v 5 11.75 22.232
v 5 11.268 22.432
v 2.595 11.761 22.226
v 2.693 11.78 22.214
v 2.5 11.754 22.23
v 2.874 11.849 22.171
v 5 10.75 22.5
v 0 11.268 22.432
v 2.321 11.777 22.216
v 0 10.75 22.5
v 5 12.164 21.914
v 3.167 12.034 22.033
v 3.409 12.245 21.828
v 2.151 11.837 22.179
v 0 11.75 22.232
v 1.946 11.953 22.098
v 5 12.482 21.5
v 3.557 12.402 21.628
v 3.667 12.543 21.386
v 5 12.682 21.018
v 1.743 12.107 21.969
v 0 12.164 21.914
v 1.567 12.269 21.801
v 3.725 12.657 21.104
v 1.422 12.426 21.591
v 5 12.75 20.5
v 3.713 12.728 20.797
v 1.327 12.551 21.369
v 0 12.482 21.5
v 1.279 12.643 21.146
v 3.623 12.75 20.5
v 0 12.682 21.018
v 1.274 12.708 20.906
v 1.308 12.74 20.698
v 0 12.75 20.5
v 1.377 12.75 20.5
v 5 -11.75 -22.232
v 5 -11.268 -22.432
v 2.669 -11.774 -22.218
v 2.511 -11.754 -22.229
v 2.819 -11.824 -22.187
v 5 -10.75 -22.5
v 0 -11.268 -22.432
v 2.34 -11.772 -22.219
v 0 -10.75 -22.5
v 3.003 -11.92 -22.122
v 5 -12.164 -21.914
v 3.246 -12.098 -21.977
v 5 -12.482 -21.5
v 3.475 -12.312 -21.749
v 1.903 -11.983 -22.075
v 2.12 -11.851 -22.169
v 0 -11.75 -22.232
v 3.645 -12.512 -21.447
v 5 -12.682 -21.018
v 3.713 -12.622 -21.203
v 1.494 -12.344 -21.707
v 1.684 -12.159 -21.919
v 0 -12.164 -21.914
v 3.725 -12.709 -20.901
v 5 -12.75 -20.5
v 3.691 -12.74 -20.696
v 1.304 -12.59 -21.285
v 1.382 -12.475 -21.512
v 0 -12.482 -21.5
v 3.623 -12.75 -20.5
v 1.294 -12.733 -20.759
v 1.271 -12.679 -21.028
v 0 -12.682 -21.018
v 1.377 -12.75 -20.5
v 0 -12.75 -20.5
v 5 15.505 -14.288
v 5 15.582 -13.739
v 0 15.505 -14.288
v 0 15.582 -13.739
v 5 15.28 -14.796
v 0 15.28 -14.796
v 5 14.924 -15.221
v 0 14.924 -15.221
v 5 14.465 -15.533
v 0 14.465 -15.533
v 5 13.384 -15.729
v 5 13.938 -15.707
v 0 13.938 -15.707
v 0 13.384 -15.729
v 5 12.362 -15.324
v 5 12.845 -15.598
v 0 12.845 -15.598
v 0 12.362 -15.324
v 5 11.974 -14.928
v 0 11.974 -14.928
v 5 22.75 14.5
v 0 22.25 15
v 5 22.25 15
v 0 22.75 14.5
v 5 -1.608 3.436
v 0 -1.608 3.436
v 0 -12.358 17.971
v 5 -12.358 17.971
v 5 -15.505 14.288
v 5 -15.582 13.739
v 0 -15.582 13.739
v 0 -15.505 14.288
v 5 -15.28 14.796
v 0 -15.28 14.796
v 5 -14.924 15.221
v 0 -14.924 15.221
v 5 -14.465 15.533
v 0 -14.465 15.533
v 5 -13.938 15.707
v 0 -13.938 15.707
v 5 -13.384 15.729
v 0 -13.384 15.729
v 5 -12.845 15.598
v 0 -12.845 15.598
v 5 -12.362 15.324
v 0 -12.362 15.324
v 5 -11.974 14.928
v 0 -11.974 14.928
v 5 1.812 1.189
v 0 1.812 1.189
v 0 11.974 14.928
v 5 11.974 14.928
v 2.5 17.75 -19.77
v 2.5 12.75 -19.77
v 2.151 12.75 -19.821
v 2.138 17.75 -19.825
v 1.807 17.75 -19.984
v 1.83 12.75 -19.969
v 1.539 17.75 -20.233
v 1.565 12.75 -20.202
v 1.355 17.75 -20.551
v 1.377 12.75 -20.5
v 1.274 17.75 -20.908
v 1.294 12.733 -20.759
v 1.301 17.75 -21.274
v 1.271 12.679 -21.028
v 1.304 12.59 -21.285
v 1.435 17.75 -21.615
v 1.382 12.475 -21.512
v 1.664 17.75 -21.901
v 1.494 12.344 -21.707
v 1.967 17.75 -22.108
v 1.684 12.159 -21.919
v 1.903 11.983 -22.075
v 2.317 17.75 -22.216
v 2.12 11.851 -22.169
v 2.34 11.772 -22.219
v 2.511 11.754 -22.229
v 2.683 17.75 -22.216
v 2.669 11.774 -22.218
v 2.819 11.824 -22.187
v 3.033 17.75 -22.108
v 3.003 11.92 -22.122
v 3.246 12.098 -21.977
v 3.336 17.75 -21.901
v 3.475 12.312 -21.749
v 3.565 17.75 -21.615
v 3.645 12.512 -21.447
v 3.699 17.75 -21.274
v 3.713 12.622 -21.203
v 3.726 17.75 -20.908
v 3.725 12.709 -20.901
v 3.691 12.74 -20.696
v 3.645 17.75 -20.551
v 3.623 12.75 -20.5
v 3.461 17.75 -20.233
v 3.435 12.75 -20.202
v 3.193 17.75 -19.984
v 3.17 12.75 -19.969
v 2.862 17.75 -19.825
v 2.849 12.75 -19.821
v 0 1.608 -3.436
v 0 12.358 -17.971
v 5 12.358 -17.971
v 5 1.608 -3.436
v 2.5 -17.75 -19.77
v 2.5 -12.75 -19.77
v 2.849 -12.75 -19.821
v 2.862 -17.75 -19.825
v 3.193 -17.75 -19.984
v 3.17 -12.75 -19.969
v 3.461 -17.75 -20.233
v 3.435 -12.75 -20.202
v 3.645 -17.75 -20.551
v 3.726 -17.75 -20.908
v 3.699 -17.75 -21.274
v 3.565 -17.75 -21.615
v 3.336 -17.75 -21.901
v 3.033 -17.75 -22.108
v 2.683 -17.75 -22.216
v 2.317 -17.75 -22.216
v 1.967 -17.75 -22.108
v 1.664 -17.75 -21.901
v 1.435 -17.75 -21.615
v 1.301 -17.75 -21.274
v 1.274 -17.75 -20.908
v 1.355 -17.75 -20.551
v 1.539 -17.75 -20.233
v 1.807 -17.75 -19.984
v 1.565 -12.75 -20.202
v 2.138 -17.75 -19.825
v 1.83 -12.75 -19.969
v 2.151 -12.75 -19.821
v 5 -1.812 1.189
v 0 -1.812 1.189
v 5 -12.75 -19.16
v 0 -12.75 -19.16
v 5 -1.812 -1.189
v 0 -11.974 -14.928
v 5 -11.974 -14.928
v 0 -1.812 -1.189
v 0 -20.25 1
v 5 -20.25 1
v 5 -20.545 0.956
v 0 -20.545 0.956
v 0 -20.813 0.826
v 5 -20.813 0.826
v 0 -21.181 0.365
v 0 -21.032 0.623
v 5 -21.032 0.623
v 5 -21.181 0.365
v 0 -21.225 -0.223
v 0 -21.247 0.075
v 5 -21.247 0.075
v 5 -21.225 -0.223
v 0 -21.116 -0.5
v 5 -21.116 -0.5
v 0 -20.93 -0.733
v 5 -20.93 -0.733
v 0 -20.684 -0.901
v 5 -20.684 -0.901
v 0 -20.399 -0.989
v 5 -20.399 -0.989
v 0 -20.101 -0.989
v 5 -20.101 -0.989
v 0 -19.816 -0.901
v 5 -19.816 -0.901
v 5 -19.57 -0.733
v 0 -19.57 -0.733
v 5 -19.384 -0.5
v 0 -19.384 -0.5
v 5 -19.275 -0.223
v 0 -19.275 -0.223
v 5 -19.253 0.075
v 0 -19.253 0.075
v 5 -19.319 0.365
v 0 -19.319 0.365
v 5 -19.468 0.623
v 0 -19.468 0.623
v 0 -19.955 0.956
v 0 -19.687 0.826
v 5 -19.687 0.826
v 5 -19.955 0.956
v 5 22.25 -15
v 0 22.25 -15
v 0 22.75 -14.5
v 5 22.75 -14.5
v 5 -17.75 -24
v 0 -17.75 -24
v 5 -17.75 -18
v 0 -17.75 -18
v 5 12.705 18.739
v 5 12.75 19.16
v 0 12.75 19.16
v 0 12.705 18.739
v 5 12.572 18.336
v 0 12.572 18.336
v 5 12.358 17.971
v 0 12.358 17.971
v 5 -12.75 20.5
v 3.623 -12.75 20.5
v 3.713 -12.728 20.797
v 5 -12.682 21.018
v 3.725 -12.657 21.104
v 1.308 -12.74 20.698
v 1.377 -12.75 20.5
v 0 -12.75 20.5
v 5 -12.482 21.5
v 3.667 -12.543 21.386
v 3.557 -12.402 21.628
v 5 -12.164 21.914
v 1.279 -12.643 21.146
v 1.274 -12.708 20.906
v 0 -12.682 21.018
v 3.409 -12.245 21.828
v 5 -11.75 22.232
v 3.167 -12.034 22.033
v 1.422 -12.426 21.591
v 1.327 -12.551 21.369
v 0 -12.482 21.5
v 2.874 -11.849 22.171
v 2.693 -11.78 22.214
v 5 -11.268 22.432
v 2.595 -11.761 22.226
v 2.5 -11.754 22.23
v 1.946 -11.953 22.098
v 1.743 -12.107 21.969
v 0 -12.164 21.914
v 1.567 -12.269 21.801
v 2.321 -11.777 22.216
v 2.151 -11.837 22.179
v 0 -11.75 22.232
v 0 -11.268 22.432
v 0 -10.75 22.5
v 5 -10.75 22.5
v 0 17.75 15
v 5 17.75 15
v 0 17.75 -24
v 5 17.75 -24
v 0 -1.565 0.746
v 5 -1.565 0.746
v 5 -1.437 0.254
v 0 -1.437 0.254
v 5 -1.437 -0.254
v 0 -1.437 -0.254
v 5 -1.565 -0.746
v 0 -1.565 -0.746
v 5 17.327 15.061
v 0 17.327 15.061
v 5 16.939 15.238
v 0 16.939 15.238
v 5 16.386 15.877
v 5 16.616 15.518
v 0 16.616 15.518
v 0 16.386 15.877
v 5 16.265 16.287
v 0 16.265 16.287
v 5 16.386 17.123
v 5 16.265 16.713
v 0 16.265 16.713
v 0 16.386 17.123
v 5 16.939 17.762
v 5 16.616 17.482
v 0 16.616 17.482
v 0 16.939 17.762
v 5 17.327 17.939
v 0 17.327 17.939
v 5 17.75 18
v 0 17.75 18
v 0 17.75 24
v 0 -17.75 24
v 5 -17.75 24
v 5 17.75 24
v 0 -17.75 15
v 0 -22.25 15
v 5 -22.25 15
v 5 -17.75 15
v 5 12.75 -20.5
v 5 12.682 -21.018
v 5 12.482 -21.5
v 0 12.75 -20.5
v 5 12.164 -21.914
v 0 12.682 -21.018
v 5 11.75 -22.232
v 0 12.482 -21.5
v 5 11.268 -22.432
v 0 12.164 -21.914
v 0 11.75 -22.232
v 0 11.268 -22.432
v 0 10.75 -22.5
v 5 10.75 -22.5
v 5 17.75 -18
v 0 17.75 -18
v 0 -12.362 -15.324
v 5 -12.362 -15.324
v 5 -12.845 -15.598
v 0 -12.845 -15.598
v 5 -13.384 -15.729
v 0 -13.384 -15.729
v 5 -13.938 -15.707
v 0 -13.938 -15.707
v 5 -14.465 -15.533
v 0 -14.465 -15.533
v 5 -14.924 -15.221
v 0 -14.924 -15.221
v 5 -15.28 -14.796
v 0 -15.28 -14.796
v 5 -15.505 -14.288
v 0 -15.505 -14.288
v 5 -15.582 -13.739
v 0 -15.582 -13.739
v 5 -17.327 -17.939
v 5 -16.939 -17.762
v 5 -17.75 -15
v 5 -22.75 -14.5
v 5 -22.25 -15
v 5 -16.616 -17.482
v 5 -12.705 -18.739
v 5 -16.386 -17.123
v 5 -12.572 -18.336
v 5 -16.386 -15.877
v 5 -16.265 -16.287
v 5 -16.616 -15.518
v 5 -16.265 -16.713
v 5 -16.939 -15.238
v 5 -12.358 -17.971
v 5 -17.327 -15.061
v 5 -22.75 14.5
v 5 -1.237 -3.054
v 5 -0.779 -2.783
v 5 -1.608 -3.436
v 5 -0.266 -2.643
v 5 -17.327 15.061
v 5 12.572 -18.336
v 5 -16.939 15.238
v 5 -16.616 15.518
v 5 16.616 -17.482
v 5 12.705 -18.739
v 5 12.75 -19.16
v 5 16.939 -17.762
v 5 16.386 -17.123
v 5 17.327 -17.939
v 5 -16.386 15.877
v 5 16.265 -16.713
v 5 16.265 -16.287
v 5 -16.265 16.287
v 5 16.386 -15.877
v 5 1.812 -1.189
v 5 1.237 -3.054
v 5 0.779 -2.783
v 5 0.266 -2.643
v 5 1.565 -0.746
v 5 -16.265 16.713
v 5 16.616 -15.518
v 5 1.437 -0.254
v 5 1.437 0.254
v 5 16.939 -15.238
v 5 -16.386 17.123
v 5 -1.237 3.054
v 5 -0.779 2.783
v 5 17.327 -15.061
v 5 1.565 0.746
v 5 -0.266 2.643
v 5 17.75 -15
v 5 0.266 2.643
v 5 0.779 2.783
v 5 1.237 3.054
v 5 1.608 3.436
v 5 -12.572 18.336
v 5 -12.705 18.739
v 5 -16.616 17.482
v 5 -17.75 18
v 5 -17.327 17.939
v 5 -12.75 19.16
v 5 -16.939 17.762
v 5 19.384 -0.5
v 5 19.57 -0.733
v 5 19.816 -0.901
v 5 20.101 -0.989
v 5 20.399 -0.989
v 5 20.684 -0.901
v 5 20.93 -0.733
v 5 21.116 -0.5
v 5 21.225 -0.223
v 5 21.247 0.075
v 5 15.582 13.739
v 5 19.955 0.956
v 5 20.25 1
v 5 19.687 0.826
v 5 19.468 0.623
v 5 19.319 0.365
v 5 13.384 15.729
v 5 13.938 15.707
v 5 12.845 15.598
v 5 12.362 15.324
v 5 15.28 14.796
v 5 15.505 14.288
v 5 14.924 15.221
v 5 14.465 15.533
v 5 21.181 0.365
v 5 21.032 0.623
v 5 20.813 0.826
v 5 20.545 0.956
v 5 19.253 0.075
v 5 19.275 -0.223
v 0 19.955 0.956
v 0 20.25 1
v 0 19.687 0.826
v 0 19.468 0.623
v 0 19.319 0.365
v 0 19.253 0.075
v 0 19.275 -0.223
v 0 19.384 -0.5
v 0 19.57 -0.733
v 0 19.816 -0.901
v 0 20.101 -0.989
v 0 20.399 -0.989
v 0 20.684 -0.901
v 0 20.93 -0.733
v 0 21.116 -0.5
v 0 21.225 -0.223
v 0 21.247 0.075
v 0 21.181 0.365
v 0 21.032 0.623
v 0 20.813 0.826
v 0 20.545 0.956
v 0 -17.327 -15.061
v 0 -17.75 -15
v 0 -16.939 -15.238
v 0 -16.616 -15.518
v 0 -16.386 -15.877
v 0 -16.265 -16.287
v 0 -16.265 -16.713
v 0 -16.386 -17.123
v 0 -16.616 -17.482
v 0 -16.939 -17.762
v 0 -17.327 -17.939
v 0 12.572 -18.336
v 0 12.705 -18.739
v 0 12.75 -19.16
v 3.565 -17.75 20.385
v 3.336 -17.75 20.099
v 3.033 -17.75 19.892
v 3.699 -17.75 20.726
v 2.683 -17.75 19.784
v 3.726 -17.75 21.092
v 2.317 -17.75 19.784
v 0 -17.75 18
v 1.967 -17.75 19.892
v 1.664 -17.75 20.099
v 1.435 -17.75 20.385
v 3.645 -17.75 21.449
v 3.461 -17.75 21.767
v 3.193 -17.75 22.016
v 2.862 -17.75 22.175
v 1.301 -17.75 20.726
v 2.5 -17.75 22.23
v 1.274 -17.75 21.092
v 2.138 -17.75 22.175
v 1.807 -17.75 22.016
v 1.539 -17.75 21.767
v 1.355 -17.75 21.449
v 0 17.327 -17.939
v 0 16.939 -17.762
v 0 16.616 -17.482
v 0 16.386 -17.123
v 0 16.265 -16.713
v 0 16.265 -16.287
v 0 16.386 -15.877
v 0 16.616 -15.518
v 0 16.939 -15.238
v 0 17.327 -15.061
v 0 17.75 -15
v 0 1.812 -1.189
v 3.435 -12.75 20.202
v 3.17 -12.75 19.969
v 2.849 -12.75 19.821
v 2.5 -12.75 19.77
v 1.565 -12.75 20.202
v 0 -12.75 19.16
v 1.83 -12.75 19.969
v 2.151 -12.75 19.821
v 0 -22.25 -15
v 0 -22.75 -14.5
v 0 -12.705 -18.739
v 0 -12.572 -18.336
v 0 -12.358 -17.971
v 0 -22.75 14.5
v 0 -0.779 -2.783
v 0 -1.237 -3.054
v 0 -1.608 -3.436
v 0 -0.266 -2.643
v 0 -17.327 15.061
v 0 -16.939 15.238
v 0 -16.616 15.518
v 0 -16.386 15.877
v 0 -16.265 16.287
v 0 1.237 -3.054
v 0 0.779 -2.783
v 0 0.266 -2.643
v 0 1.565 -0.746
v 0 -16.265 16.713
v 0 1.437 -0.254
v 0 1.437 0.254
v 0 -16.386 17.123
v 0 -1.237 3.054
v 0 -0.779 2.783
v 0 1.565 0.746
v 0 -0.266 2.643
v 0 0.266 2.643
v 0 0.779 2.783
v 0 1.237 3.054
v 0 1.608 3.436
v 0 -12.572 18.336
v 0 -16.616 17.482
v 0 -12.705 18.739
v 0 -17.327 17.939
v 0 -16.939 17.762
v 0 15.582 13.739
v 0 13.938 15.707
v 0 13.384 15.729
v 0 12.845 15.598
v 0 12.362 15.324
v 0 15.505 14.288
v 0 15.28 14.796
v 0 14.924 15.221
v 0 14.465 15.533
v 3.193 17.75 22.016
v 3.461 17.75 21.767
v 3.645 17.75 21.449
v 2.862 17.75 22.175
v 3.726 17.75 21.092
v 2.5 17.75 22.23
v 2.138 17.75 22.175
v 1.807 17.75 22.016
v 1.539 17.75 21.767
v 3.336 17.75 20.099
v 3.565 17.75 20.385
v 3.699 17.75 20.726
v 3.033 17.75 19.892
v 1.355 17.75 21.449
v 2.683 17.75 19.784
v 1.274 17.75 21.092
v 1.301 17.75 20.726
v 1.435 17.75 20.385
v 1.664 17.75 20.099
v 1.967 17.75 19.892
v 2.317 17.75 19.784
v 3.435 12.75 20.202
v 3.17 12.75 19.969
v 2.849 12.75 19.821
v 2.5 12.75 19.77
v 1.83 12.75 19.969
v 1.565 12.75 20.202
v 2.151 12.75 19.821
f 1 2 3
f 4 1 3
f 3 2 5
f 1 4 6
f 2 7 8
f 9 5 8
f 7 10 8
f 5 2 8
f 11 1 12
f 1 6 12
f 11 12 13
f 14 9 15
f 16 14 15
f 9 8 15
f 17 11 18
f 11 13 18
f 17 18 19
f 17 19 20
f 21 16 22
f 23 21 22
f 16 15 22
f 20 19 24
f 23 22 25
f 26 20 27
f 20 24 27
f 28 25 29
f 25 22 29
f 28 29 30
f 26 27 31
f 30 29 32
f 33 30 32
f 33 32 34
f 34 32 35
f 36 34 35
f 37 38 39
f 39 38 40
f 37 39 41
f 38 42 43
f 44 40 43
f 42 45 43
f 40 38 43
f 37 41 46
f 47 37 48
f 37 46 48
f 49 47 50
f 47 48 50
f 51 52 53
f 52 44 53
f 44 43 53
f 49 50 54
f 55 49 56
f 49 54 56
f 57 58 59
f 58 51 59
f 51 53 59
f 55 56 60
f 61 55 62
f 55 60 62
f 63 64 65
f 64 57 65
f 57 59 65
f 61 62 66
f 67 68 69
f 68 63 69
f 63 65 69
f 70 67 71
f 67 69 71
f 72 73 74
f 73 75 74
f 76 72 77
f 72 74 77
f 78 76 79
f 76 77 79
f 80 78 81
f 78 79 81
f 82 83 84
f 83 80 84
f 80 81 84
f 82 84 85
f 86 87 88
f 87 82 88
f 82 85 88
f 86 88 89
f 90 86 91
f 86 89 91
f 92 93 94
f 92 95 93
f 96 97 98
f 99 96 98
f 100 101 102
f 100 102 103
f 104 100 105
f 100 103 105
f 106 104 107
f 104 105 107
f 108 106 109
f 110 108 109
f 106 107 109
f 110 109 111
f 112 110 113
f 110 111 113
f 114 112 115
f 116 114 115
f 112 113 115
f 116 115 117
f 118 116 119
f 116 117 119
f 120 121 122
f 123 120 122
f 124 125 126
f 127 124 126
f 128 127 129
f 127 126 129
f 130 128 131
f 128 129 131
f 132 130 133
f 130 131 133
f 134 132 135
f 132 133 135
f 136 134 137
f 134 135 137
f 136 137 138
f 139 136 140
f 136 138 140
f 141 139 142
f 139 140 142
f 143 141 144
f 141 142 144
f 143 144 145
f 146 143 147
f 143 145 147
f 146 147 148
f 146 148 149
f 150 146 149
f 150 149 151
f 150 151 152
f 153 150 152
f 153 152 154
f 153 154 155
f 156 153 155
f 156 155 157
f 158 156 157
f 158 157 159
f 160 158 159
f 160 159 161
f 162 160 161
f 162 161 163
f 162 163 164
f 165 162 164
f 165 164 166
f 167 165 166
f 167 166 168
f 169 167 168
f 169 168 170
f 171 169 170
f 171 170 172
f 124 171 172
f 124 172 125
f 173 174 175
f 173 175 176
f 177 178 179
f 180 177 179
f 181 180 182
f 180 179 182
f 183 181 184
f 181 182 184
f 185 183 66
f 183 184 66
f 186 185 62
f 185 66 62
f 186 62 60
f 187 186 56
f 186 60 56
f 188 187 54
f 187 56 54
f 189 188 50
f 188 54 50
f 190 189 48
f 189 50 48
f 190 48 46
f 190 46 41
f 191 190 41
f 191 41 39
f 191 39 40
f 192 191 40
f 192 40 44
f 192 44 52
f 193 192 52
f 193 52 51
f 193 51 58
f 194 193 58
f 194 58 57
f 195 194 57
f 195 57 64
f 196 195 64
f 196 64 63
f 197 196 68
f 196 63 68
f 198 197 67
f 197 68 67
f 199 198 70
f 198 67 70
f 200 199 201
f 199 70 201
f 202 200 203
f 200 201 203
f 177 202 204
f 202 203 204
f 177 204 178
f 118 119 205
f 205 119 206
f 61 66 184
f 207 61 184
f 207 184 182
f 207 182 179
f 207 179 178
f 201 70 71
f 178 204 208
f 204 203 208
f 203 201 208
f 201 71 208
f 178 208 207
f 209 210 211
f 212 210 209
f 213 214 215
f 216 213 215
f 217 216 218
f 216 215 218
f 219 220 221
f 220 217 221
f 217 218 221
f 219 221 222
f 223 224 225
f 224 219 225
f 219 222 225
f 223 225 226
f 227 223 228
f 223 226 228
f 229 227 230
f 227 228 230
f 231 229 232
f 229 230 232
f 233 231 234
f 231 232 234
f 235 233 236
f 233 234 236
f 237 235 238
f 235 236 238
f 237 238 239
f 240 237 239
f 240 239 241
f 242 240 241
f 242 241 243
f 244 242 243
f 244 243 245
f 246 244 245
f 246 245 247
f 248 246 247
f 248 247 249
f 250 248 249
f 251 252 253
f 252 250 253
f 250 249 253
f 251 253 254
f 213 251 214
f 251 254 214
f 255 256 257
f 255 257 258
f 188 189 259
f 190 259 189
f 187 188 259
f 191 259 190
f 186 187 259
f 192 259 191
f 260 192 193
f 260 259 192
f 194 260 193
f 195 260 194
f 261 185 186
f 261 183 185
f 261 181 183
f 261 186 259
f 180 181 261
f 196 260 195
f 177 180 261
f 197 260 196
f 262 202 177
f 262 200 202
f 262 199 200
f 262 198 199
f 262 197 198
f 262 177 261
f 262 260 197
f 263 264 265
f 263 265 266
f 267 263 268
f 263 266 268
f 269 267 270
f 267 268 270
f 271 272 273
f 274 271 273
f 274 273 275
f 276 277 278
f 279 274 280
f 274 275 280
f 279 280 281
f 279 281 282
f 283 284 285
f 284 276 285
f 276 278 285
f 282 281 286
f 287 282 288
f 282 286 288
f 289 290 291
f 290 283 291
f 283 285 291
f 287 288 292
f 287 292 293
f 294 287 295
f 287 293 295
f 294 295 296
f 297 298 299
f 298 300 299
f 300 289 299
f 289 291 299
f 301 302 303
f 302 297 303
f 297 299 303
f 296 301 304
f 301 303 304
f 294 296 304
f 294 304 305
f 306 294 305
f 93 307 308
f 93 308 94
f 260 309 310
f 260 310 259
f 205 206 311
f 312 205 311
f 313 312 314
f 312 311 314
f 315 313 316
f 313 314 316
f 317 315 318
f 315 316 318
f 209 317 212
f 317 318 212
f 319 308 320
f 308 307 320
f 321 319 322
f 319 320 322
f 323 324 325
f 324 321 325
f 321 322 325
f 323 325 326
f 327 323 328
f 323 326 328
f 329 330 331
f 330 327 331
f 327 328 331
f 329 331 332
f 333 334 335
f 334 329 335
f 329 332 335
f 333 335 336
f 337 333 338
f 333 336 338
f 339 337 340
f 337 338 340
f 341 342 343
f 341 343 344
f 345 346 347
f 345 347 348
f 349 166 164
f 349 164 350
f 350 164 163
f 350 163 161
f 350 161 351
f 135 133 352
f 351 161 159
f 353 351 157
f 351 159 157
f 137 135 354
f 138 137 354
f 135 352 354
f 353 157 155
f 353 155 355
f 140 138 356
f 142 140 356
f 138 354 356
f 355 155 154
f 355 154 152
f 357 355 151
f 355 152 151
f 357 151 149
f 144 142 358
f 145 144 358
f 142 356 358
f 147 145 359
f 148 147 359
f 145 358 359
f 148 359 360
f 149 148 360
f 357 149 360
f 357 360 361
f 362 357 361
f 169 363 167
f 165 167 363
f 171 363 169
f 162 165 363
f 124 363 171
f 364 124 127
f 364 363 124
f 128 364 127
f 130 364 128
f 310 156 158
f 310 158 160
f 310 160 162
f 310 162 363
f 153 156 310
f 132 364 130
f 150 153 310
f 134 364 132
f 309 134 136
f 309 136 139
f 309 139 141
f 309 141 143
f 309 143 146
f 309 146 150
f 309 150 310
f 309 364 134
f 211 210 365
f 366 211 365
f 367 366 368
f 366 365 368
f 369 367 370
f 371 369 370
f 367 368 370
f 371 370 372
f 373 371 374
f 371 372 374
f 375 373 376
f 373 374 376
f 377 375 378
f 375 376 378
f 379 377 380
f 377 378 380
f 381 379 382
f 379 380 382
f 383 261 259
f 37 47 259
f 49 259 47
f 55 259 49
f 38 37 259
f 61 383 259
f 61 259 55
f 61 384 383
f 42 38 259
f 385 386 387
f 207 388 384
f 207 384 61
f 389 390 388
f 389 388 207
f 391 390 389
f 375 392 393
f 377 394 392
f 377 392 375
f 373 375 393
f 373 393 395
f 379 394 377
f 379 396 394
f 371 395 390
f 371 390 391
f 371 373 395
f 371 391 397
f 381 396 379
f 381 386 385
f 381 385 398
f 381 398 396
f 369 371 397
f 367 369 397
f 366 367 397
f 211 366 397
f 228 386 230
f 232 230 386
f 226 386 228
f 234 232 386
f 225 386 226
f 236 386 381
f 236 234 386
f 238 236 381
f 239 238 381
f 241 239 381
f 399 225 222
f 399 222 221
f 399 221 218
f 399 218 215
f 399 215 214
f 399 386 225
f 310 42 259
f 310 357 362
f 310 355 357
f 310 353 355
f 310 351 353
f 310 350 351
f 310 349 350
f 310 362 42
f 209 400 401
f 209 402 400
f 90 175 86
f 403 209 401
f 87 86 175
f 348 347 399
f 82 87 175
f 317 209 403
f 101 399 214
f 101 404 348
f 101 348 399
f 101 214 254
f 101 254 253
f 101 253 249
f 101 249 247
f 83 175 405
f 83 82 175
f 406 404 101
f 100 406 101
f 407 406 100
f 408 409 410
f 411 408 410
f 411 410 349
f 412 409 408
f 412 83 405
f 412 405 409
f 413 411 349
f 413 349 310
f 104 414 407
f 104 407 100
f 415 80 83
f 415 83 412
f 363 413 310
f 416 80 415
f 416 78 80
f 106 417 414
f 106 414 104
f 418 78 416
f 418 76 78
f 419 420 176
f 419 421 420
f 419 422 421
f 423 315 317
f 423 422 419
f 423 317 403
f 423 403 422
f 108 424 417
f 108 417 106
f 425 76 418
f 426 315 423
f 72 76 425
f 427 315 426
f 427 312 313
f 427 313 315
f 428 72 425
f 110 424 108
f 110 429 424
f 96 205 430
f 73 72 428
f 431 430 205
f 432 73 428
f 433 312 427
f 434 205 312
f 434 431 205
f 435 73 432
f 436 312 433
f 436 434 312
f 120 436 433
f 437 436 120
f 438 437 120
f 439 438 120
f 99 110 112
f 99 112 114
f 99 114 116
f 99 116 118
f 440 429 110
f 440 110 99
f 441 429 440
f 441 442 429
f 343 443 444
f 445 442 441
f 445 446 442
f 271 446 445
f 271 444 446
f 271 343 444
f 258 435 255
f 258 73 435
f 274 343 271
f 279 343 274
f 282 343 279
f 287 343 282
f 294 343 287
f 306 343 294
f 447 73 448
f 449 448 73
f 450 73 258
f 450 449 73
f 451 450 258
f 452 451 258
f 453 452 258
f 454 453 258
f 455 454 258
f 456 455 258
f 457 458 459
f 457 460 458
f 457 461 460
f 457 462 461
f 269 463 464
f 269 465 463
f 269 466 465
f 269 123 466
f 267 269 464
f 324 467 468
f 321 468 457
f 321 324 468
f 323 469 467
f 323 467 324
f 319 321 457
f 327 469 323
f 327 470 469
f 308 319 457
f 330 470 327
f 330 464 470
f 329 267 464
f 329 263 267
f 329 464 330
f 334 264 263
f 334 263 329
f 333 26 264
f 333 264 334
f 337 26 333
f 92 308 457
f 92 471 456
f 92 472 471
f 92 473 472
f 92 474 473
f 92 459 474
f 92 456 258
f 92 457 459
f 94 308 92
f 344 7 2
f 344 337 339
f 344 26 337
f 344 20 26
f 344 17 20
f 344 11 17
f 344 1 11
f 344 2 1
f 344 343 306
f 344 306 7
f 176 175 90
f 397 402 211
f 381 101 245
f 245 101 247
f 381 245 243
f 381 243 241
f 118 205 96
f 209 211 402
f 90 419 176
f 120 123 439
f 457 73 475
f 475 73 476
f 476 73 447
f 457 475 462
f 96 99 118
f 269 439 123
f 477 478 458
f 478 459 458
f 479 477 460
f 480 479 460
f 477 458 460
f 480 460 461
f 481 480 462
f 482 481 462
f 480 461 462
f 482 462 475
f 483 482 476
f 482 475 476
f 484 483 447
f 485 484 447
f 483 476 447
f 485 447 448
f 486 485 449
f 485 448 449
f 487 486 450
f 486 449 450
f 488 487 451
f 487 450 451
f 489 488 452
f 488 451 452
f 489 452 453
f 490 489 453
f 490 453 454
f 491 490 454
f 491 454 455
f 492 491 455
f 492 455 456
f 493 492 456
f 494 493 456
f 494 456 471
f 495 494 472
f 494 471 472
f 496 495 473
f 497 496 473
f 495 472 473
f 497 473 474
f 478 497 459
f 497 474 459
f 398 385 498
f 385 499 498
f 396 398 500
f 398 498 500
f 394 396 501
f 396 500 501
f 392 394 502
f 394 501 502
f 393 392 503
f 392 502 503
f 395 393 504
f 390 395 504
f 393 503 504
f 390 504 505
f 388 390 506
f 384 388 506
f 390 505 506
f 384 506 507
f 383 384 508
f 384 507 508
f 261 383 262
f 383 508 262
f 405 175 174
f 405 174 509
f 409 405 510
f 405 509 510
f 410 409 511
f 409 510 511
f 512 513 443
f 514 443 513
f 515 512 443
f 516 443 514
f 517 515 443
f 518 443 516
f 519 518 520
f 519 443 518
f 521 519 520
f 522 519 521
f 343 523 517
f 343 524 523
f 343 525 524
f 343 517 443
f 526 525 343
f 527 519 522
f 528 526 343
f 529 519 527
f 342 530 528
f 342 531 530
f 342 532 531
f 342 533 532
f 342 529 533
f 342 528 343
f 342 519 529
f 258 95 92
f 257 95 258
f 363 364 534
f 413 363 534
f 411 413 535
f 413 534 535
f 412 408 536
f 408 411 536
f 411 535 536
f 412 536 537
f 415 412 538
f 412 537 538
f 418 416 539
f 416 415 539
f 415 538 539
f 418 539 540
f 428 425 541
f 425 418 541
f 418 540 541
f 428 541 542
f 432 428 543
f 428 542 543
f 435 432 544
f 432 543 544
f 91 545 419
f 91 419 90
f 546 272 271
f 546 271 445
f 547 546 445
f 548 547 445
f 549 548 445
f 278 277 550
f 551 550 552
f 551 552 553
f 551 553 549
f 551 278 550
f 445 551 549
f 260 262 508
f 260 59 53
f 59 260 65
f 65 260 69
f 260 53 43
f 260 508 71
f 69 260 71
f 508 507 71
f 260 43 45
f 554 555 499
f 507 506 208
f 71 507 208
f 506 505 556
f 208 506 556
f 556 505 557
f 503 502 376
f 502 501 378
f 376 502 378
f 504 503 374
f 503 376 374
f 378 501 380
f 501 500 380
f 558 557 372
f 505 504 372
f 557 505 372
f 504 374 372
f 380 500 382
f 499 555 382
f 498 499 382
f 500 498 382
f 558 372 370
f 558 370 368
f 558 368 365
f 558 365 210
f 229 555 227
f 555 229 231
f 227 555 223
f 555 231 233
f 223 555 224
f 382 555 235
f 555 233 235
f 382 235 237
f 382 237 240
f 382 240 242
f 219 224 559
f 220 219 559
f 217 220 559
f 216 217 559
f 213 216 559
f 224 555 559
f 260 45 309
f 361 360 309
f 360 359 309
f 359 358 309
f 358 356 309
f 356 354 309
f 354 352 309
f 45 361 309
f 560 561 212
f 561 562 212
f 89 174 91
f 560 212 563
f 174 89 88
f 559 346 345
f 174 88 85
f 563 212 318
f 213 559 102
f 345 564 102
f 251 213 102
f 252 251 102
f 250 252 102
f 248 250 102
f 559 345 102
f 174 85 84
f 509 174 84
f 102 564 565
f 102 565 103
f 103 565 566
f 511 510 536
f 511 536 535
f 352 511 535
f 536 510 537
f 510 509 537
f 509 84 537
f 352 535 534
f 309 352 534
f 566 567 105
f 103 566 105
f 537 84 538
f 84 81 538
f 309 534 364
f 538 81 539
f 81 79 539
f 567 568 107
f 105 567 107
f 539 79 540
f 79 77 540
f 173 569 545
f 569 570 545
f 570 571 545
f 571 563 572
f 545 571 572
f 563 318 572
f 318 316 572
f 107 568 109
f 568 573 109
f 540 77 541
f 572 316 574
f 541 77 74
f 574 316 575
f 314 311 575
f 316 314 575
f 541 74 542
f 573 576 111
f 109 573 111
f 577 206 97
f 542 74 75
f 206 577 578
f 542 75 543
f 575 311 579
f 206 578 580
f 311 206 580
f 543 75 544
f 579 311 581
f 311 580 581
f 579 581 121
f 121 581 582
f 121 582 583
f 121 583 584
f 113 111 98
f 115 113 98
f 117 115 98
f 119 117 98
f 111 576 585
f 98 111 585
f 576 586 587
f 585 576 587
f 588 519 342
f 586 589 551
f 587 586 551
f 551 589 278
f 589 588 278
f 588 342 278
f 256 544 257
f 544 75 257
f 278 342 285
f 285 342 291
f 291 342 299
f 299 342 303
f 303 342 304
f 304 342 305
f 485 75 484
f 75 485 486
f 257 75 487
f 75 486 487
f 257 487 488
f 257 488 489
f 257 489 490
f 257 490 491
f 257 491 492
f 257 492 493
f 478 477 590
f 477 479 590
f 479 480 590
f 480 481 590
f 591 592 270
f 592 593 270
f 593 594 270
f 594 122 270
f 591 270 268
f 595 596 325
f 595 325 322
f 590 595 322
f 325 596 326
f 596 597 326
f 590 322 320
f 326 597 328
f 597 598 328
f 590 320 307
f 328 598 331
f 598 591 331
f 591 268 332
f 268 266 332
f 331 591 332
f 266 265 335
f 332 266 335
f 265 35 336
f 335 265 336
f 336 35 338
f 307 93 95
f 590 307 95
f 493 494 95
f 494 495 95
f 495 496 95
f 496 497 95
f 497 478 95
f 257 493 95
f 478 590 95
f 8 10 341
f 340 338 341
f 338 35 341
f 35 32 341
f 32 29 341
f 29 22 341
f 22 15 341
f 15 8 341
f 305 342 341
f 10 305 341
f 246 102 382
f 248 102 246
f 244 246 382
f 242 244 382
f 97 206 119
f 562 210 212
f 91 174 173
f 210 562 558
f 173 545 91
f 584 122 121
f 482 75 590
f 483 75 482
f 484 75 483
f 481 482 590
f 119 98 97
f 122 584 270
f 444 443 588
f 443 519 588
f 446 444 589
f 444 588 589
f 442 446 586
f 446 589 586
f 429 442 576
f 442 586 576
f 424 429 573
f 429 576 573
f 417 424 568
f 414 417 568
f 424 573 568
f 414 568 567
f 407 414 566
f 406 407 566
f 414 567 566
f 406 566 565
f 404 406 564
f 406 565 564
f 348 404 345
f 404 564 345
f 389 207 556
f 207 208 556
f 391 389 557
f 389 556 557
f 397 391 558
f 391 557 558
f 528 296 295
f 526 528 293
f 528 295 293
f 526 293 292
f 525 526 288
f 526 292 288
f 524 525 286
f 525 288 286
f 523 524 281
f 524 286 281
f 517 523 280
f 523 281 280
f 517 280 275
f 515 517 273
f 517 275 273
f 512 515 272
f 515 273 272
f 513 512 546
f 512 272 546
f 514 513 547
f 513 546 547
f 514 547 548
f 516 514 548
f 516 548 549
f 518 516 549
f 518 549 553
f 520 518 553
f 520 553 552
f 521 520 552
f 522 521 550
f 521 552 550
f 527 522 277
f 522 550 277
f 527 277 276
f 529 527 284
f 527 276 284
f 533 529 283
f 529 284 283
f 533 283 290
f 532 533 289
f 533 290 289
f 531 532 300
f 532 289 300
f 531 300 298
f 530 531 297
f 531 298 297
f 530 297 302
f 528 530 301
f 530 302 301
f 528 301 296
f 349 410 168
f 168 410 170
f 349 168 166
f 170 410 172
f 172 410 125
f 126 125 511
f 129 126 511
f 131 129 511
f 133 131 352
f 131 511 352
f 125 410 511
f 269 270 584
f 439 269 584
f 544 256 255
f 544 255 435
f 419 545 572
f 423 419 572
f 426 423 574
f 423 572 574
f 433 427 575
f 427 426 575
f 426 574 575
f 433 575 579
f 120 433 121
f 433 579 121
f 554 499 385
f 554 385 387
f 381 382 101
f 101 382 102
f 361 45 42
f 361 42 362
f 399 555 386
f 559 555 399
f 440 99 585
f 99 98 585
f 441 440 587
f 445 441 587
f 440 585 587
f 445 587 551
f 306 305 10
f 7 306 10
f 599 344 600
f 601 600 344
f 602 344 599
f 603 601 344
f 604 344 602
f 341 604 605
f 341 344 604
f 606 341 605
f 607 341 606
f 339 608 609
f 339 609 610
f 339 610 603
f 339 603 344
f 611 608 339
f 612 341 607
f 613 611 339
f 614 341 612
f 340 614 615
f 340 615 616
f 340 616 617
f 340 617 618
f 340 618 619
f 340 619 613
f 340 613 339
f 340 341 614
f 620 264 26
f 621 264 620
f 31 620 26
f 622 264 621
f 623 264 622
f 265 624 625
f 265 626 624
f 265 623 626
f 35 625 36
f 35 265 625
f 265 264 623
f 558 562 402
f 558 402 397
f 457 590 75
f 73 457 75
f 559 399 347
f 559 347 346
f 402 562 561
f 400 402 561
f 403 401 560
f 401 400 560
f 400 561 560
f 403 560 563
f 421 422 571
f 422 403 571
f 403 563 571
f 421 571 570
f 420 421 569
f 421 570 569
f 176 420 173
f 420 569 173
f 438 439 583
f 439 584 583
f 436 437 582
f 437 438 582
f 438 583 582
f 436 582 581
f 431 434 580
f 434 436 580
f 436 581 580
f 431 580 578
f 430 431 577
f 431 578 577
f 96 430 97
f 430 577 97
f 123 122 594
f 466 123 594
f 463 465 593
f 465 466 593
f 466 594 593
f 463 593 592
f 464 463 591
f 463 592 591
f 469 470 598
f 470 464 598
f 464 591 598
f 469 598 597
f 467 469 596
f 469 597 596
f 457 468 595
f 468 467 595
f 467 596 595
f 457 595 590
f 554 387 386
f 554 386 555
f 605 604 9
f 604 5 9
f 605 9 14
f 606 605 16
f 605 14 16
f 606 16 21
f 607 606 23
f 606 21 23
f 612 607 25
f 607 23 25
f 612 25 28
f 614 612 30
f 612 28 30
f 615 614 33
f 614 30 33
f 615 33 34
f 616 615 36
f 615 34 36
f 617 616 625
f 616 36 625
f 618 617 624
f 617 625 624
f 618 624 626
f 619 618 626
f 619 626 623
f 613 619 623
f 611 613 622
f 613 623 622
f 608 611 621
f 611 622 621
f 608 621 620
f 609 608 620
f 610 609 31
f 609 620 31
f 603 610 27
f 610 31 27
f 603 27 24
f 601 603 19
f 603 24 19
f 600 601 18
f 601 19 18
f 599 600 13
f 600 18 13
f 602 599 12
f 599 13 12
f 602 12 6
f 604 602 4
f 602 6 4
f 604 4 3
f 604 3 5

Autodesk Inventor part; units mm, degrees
ref_plane "YZ Plane" through (0, 0, 0) normal (1, 0, 0) x (0, 1, 0)
ref_plane "XZ Plane" through (0, 0, 0) normal (0, 1, 0) x (-1, 0, 0)
ref_plane "XY Plane" through (0, 0, 0) normal (0, 0, 1) x (1, 0, 0)
sketch "Sketch1" plane through (0, 0, 0) normal (1, 0, 0) x (0, 1, 0)
  line L0 (-17.75, 24) -> (17.75, 24)
  line L1 (17.75, 24) -> (17.75, -24)
  line L2 (17.75, -24) -> (-17.75, -24)
  line L3 (-17.75, -24) -> (-17.75, 24)
  line L4 (-17.75, 24) -> (17.75, -24) construction
  line L5 (17.75, 24) -> (-17.75, -24) construction
  line L6 (17.75, 15) -> (22.75, 15)
  line L7 (22.75, 15) -> (22.75, -15)
  line L8 (22.75, -15) -> (17.75, -15)
  line L9 (17.75, 0) -> (-17.75, 0) construction
  line L10 (0, 24) -> (0, -24)
  arc A0 (17.75, 18) -> (17.75, 15) centre (17.75, 16.5) ccw
  line L11 (17.75, -15) -> (22.75, -15)
  arc A1 (17.75, -15) -> (17.75, -18) centre (17.75, -16.5) ccw
  line L12 (-17.75, 15) -> (-22.75, 15)
  line L13 (-22.75, 15) -> (-22.75, -15)
  line L14 (-22.75, -15) -> (-17.75, -15)
  arc A2 (-17.75, 15) -> (-17.75, 18) centre (-17.75, 16.5) ccw
  arc A3 (-17.75, -18) -> (-17.75, -15) centre (-17.75, -16.5) ccw
  line L15 (17.75, 21) -> (12.75, 21) construction
  line L16 (-10.75, 22.5) -> (10.75, 22.5)
  line L17 (12.358, 17.9707) -> (1.608, 3.4355)
  line L18 (-12.358, 17.9707) -> (-1.608, 3.4355)
  line L19 (1.8124, 1.1893) -> (11.9735, 14.9282)
  line L20 (15.5815, 13.7389) -> (15.5815, -13.7389)
  line L21 (1.8124, -1.1893) -> (11.9735, -14.9282)
  arc A4 (-1.608, 3.4355) -> (1.608, 3.4355) centre (0, 4.6248) ccw
  arc A5 (15.5815, 13.7389) -> (11.9735, 14.9282) centre (13.5815, 13.7389) ccw
  arc A6 (1.8124, 1.1893) -> (1.8124, -1.1893) centre (3.4204, 0) ccw
  arc A7 (11.9735, -14.9282) -> (15.5815, -13.7389) centre (13.5815, -13.7389) ccw
  line L22 (17.75, -21) -> (12.75, -21) construction
  line L23 (12.75, 19.16) -> (12.75, 20.5)
  line L24 (-12.75, 19.16) -> (-12.75, 20.5)
  arc A8 (12.75, 20.5) -> (10.75, 22.5) centre (10.75, 20.5) ccw
  arc A9 (12.358, 17.9707) -> (12.75, 19.16) centre (10.75, 19.16) ccw
  arc A10 (-10.75, 22.5) -> (-12.75, 20.5) centre (-10.75, 20.5) ccw
  arc A11 (-12.75, 19.16) -> (-12.358, 17.9707) centre (-10.75, 19.16) ccw
  circle A12 centre (20.25, 0) radius 1 construction
  line L25 (20.25, 15) -> (20.25, -15) construction
  line L26 (-10.75, -22.5) -> (10.75, -22.5)
  line L27 (12.358, -17.9707) -> (1.608, -3.4355)
  line L28 (-12.358, -17.9707) -> (-1.608, -3.4355)
  arc A13 (1.608, -3.4355) -> (-1.608, -3.4355) centre (0, -4.6248) ccw
  line L29 (12.75, -19.16) -> (12.75, -20.5)
  line L30 (-12.75, -19.16) -> (-12.75, -20.5)
  arc A14 (10.75, -22.5) -> (12.75, -20.5) centre (10.75, -20.5) ccw
  arc A15 (12.75, -19.16) -> (12.358, -17.9707) centre (10.75, -19.16) ccw
  arc A16 (-12.75, -20.5) -> (-10.75, -22.5) centre (-10.75, -20.5) ccw
  arc A17 (-12.358, -17.9707) -> (-12.75, -19.16) centre (-10.75, -19.16) ccw
  point P0 (0, 0)
  point P1 (0, 1.2613)
  point P2 (0.9328, 0)
  point P3 (15.5815, 19.8066)
  point P4 (15.5815, -19.8066)
  point P5 (-12.75, 22.5)
  point P6 (12.75, 22.5)
  point P7 (0, 2.6248)
  point P8 (17.75, -18)
  point P9 (0, 22.5)
  point P10 (12.75, 18.5007)
  point P11 (-12.75, 18.5007)
  point P12 (0, -2.6248)
  point P13 (0, -22.5)
  dimension "d0" = 1.5
  dimension "d1" = 5
  dimension "d2" = 48
  dimension "d3" = 9
  dimension "d4" = 35.5
  dimension "d5" = 5
  dimension "d6" = 1.5
  dimension "d8" = 1.5
  dimension "d9" = 1.5
  dimension "d22" = 2
  dimension "d24" = 2
extrude "Extrusion1" add sketch "Sketch1" along normal blind 5 contours L0 L1 A0 A1 L2 L10 L26 A14 L29 A15 L27 A13 A4 L17 A9 L23 A8 L16 | L6 L7 L8 L1
sketch "Sketch2" plane through (0, 17.75, 24) normal (0, 1, 0) x (1, 0, 0)
  line L0 (0, 45) -> (5, 45)
  line L1 (0, 3) -> (5, 3)
  line L2 (5, 6) -> (5, 0) projected
  line L3 (5, 48) -> (5, 42) projected
  line L4 (0, 6) -> (0, 0) projected
  line L5 (0, 48) -> (0, 42) projected
  point P0 (0, 3)
  point P1 (0, 3)
  point P2 (0, 3)
  point P3 (0, 45)
  point P4 (2.5, 3)
  point P5 (2.5, 45)
hole "Side-M3" at (2.5, 17.75, -21) at (2.5, 17.75, 21) direction (0, -1, 0) diameter 2.459 end through all thread size "M3x0.5" class "6H" standard "ISO Metric profile"
hole "Phi2-H7" at (0, 20.25, 0) direction (1, 0, 0) diameter 2 end through all
chamfer "C0.5" distance 0.5 angle 45 2 edges at (2.5, 22.75, 15) (2.5, 22.75, -15)
mirror "Mirror1" about plane through (0, 0, 2.6248) normal (0, -1, 0)
equation "\"d8\" = d6"
equation "\"d9\" = d6"
equation "\"d17\" = d5"
properties part number "KneeBraceFrame" material "Acetal Resin, Black"
